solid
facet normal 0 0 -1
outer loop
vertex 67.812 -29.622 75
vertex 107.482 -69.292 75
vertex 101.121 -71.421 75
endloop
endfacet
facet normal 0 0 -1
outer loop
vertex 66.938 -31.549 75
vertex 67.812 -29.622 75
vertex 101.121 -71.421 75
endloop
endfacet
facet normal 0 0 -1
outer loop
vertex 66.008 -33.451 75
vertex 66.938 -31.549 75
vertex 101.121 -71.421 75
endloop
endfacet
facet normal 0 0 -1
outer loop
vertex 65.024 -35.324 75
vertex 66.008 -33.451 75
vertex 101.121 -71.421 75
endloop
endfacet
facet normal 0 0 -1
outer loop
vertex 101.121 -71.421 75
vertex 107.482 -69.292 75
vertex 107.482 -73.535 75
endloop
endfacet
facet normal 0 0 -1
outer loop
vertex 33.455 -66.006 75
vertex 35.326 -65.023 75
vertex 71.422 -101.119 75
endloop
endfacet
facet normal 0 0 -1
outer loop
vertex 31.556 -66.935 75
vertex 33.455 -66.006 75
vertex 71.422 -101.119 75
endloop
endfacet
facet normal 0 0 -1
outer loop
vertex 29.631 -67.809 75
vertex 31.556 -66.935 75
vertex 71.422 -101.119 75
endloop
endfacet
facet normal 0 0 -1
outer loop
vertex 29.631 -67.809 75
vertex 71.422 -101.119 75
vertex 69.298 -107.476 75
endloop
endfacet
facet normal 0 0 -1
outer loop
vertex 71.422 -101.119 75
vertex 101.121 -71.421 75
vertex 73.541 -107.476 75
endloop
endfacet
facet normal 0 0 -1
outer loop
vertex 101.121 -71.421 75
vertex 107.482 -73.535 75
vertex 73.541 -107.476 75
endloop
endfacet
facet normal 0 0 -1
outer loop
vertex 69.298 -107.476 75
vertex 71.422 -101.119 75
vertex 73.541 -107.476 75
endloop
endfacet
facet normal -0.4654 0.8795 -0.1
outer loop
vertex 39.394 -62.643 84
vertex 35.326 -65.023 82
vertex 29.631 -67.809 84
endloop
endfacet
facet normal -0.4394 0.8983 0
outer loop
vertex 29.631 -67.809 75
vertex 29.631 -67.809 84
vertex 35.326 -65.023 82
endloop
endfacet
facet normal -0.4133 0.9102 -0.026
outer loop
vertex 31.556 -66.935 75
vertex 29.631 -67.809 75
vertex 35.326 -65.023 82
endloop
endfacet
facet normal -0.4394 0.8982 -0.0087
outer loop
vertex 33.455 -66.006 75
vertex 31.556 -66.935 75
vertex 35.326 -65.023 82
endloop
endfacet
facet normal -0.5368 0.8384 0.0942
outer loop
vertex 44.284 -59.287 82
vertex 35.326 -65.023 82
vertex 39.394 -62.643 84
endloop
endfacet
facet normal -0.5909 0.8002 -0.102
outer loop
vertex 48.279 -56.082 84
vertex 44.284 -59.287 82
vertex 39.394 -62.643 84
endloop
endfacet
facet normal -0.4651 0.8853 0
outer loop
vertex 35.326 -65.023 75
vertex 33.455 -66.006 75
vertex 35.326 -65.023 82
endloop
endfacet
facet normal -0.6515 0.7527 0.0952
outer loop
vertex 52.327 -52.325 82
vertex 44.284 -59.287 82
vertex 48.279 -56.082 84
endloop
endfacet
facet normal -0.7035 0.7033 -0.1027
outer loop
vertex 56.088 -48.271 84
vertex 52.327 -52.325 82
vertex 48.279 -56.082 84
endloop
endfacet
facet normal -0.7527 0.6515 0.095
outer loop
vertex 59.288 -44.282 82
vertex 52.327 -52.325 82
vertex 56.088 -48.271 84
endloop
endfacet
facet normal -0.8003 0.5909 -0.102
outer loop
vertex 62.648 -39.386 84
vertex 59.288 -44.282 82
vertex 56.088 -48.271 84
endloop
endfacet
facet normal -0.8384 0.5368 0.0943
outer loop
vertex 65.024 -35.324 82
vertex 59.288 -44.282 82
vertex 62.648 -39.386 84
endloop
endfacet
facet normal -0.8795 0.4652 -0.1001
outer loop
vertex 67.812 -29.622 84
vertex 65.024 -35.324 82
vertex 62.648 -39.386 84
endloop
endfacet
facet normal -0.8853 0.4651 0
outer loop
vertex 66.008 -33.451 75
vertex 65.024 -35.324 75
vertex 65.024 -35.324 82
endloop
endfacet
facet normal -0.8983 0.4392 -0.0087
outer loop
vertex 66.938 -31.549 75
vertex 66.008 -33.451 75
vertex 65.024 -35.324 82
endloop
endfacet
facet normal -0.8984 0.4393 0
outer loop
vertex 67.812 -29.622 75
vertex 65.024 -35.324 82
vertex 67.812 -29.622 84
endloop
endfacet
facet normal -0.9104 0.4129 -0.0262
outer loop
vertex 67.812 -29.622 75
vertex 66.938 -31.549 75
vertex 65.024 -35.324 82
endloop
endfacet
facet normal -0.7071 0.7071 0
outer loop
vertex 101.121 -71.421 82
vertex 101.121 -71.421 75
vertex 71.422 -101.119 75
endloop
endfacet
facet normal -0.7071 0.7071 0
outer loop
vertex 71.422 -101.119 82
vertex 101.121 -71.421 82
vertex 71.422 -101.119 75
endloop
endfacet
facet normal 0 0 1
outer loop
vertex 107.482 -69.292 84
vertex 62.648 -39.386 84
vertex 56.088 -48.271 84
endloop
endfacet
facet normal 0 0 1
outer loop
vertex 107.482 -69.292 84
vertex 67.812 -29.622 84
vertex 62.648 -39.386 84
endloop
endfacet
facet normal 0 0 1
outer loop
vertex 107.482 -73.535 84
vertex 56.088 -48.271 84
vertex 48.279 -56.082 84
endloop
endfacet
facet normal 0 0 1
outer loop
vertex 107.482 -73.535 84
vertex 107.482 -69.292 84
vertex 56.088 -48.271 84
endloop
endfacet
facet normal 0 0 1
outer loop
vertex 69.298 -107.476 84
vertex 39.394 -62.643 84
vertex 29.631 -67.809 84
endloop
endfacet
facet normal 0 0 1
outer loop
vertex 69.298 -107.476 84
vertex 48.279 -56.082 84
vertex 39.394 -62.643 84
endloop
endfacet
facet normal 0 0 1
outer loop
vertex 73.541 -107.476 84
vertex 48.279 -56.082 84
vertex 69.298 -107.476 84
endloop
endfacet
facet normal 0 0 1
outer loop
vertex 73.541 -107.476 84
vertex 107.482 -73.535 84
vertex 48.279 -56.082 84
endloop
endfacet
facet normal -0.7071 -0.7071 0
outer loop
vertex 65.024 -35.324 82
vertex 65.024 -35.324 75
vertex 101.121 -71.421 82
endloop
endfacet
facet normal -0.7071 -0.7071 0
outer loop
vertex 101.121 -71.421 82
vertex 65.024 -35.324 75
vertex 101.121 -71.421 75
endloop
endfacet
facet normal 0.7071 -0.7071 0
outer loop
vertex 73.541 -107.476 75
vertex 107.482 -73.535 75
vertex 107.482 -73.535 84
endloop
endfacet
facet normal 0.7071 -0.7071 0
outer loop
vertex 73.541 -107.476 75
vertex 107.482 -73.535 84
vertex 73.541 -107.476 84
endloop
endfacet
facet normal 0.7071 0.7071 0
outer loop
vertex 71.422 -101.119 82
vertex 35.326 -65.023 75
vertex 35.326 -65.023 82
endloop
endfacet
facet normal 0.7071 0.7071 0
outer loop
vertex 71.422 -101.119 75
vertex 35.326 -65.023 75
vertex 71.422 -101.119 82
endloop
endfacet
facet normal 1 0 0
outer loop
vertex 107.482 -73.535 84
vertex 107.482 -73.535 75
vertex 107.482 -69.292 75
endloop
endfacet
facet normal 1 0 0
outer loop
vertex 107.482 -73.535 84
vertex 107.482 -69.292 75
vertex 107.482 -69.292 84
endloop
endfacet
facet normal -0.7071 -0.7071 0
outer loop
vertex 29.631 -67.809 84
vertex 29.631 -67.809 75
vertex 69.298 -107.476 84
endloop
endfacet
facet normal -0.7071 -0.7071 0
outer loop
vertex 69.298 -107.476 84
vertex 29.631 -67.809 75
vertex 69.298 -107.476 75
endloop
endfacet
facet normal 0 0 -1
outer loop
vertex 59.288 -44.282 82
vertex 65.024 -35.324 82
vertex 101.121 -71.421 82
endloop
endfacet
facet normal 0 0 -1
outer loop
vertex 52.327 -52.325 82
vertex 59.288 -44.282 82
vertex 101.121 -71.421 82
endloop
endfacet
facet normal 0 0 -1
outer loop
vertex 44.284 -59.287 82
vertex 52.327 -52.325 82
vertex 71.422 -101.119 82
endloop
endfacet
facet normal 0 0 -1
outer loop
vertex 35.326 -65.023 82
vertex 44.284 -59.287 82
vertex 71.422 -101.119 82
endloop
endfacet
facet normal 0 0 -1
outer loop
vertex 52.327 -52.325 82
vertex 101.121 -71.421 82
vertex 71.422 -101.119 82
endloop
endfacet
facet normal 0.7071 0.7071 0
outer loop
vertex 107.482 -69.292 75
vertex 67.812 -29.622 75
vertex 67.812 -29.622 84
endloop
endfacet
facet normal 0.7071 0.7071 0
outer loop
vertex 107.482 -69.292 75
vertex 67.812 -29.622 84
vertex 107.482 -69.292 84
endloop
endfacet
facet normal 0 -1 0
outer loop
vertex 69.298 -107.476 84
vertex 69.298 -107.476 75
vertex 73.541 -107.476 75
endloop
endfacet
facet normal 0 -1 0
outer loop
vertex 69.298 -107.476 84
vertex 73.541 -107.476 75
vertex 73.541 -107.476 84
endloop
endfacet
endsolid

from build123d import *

# Parameters (mm, degrees)
CYLINDER1708_R              = 74
CYLINDER1708_DEPTH          = 40
BOX671_W                    = 42
BOX671_H                    = 62
BOX671_DEPTH                = 50
COMPOUND846_PLACEMENT_ANGLE = 225
BOX672_W                    = 54
BOX672_H                    = 68
BOX672_DEPTH                = 9
COMPOUND847_PLACEMENT_ANGLE = 225
CHAMFER053_SIZE             = 3


with BuildPart() as v_lec1708:
    # Cylinder1708 → Cylinder1708 (new body)
    with BuildSketch(Plane.XY.offset(44)):
        Circle(CYLINDER1708_R)
    extrude(amount=CYLINDER1708_DEPTH)


with BuildPart() as compound846:
    # Box671 → Box671 (new body)
    with BuildSketch(Plane(origin=(-21.001071, 60.005081, 31), x_dir=(1, 0, 0), z_dir=(0, 0, 1))):
        with Locations((21, 31)):
            Rectangle(BOX671_W, BOX671_H)
    extrude(amount=BOX671_DEPTH)


with BuildPart() as compound846_1:
    # Compound846 placement: moved
    add(compound846.part.moved(Location((0, 0, 1))).rotate(Axis((0, 0, 1), (0, 0, 1)), COMPOUND846_PLACEMENT_ANGLE))


with BuildPart() as chamfer053:
    # Box672 → Box672 (new body)
    with BuildSketch(Plane(origin=(-27.004408, 59.99801, 75), x_dir=(1, 0, 0), z_dir=(0, 0, 1))):
        with Locations((27, 34)):
            Rectangle(BOX672_W, BOX672_H)
    extrude(amount=BOX672_DEPTH)


with BuildPart() as chamfer053_1:
    # Compound847 placement: moved
    add(chamfer053.part.rotate(Axis((0, 0, 0), (0, 0, 1)), COMPOUND847_PLACEMENT_ANGLE))

    # Cut489: cut Compound846
    add(compound846_1.part, mode=Mode.SUBTRACT)

    # Cut490: cut Válec1708
    add(v_lec1708.part, mode=Mode.SUBTRACT)

    # Chamfer053
    chamfer053_edges = [chamfer053_1.edges().sort_by_distance(p)[0] for p in [
        (109.603261, -71.413261, 79.5),
        (71.419495, -109.597027, 79.5),
    ]]
    chamfer(chamfer053_edges, length=CHAMFER053_SIZE)


solid = chamfer053_1.part
